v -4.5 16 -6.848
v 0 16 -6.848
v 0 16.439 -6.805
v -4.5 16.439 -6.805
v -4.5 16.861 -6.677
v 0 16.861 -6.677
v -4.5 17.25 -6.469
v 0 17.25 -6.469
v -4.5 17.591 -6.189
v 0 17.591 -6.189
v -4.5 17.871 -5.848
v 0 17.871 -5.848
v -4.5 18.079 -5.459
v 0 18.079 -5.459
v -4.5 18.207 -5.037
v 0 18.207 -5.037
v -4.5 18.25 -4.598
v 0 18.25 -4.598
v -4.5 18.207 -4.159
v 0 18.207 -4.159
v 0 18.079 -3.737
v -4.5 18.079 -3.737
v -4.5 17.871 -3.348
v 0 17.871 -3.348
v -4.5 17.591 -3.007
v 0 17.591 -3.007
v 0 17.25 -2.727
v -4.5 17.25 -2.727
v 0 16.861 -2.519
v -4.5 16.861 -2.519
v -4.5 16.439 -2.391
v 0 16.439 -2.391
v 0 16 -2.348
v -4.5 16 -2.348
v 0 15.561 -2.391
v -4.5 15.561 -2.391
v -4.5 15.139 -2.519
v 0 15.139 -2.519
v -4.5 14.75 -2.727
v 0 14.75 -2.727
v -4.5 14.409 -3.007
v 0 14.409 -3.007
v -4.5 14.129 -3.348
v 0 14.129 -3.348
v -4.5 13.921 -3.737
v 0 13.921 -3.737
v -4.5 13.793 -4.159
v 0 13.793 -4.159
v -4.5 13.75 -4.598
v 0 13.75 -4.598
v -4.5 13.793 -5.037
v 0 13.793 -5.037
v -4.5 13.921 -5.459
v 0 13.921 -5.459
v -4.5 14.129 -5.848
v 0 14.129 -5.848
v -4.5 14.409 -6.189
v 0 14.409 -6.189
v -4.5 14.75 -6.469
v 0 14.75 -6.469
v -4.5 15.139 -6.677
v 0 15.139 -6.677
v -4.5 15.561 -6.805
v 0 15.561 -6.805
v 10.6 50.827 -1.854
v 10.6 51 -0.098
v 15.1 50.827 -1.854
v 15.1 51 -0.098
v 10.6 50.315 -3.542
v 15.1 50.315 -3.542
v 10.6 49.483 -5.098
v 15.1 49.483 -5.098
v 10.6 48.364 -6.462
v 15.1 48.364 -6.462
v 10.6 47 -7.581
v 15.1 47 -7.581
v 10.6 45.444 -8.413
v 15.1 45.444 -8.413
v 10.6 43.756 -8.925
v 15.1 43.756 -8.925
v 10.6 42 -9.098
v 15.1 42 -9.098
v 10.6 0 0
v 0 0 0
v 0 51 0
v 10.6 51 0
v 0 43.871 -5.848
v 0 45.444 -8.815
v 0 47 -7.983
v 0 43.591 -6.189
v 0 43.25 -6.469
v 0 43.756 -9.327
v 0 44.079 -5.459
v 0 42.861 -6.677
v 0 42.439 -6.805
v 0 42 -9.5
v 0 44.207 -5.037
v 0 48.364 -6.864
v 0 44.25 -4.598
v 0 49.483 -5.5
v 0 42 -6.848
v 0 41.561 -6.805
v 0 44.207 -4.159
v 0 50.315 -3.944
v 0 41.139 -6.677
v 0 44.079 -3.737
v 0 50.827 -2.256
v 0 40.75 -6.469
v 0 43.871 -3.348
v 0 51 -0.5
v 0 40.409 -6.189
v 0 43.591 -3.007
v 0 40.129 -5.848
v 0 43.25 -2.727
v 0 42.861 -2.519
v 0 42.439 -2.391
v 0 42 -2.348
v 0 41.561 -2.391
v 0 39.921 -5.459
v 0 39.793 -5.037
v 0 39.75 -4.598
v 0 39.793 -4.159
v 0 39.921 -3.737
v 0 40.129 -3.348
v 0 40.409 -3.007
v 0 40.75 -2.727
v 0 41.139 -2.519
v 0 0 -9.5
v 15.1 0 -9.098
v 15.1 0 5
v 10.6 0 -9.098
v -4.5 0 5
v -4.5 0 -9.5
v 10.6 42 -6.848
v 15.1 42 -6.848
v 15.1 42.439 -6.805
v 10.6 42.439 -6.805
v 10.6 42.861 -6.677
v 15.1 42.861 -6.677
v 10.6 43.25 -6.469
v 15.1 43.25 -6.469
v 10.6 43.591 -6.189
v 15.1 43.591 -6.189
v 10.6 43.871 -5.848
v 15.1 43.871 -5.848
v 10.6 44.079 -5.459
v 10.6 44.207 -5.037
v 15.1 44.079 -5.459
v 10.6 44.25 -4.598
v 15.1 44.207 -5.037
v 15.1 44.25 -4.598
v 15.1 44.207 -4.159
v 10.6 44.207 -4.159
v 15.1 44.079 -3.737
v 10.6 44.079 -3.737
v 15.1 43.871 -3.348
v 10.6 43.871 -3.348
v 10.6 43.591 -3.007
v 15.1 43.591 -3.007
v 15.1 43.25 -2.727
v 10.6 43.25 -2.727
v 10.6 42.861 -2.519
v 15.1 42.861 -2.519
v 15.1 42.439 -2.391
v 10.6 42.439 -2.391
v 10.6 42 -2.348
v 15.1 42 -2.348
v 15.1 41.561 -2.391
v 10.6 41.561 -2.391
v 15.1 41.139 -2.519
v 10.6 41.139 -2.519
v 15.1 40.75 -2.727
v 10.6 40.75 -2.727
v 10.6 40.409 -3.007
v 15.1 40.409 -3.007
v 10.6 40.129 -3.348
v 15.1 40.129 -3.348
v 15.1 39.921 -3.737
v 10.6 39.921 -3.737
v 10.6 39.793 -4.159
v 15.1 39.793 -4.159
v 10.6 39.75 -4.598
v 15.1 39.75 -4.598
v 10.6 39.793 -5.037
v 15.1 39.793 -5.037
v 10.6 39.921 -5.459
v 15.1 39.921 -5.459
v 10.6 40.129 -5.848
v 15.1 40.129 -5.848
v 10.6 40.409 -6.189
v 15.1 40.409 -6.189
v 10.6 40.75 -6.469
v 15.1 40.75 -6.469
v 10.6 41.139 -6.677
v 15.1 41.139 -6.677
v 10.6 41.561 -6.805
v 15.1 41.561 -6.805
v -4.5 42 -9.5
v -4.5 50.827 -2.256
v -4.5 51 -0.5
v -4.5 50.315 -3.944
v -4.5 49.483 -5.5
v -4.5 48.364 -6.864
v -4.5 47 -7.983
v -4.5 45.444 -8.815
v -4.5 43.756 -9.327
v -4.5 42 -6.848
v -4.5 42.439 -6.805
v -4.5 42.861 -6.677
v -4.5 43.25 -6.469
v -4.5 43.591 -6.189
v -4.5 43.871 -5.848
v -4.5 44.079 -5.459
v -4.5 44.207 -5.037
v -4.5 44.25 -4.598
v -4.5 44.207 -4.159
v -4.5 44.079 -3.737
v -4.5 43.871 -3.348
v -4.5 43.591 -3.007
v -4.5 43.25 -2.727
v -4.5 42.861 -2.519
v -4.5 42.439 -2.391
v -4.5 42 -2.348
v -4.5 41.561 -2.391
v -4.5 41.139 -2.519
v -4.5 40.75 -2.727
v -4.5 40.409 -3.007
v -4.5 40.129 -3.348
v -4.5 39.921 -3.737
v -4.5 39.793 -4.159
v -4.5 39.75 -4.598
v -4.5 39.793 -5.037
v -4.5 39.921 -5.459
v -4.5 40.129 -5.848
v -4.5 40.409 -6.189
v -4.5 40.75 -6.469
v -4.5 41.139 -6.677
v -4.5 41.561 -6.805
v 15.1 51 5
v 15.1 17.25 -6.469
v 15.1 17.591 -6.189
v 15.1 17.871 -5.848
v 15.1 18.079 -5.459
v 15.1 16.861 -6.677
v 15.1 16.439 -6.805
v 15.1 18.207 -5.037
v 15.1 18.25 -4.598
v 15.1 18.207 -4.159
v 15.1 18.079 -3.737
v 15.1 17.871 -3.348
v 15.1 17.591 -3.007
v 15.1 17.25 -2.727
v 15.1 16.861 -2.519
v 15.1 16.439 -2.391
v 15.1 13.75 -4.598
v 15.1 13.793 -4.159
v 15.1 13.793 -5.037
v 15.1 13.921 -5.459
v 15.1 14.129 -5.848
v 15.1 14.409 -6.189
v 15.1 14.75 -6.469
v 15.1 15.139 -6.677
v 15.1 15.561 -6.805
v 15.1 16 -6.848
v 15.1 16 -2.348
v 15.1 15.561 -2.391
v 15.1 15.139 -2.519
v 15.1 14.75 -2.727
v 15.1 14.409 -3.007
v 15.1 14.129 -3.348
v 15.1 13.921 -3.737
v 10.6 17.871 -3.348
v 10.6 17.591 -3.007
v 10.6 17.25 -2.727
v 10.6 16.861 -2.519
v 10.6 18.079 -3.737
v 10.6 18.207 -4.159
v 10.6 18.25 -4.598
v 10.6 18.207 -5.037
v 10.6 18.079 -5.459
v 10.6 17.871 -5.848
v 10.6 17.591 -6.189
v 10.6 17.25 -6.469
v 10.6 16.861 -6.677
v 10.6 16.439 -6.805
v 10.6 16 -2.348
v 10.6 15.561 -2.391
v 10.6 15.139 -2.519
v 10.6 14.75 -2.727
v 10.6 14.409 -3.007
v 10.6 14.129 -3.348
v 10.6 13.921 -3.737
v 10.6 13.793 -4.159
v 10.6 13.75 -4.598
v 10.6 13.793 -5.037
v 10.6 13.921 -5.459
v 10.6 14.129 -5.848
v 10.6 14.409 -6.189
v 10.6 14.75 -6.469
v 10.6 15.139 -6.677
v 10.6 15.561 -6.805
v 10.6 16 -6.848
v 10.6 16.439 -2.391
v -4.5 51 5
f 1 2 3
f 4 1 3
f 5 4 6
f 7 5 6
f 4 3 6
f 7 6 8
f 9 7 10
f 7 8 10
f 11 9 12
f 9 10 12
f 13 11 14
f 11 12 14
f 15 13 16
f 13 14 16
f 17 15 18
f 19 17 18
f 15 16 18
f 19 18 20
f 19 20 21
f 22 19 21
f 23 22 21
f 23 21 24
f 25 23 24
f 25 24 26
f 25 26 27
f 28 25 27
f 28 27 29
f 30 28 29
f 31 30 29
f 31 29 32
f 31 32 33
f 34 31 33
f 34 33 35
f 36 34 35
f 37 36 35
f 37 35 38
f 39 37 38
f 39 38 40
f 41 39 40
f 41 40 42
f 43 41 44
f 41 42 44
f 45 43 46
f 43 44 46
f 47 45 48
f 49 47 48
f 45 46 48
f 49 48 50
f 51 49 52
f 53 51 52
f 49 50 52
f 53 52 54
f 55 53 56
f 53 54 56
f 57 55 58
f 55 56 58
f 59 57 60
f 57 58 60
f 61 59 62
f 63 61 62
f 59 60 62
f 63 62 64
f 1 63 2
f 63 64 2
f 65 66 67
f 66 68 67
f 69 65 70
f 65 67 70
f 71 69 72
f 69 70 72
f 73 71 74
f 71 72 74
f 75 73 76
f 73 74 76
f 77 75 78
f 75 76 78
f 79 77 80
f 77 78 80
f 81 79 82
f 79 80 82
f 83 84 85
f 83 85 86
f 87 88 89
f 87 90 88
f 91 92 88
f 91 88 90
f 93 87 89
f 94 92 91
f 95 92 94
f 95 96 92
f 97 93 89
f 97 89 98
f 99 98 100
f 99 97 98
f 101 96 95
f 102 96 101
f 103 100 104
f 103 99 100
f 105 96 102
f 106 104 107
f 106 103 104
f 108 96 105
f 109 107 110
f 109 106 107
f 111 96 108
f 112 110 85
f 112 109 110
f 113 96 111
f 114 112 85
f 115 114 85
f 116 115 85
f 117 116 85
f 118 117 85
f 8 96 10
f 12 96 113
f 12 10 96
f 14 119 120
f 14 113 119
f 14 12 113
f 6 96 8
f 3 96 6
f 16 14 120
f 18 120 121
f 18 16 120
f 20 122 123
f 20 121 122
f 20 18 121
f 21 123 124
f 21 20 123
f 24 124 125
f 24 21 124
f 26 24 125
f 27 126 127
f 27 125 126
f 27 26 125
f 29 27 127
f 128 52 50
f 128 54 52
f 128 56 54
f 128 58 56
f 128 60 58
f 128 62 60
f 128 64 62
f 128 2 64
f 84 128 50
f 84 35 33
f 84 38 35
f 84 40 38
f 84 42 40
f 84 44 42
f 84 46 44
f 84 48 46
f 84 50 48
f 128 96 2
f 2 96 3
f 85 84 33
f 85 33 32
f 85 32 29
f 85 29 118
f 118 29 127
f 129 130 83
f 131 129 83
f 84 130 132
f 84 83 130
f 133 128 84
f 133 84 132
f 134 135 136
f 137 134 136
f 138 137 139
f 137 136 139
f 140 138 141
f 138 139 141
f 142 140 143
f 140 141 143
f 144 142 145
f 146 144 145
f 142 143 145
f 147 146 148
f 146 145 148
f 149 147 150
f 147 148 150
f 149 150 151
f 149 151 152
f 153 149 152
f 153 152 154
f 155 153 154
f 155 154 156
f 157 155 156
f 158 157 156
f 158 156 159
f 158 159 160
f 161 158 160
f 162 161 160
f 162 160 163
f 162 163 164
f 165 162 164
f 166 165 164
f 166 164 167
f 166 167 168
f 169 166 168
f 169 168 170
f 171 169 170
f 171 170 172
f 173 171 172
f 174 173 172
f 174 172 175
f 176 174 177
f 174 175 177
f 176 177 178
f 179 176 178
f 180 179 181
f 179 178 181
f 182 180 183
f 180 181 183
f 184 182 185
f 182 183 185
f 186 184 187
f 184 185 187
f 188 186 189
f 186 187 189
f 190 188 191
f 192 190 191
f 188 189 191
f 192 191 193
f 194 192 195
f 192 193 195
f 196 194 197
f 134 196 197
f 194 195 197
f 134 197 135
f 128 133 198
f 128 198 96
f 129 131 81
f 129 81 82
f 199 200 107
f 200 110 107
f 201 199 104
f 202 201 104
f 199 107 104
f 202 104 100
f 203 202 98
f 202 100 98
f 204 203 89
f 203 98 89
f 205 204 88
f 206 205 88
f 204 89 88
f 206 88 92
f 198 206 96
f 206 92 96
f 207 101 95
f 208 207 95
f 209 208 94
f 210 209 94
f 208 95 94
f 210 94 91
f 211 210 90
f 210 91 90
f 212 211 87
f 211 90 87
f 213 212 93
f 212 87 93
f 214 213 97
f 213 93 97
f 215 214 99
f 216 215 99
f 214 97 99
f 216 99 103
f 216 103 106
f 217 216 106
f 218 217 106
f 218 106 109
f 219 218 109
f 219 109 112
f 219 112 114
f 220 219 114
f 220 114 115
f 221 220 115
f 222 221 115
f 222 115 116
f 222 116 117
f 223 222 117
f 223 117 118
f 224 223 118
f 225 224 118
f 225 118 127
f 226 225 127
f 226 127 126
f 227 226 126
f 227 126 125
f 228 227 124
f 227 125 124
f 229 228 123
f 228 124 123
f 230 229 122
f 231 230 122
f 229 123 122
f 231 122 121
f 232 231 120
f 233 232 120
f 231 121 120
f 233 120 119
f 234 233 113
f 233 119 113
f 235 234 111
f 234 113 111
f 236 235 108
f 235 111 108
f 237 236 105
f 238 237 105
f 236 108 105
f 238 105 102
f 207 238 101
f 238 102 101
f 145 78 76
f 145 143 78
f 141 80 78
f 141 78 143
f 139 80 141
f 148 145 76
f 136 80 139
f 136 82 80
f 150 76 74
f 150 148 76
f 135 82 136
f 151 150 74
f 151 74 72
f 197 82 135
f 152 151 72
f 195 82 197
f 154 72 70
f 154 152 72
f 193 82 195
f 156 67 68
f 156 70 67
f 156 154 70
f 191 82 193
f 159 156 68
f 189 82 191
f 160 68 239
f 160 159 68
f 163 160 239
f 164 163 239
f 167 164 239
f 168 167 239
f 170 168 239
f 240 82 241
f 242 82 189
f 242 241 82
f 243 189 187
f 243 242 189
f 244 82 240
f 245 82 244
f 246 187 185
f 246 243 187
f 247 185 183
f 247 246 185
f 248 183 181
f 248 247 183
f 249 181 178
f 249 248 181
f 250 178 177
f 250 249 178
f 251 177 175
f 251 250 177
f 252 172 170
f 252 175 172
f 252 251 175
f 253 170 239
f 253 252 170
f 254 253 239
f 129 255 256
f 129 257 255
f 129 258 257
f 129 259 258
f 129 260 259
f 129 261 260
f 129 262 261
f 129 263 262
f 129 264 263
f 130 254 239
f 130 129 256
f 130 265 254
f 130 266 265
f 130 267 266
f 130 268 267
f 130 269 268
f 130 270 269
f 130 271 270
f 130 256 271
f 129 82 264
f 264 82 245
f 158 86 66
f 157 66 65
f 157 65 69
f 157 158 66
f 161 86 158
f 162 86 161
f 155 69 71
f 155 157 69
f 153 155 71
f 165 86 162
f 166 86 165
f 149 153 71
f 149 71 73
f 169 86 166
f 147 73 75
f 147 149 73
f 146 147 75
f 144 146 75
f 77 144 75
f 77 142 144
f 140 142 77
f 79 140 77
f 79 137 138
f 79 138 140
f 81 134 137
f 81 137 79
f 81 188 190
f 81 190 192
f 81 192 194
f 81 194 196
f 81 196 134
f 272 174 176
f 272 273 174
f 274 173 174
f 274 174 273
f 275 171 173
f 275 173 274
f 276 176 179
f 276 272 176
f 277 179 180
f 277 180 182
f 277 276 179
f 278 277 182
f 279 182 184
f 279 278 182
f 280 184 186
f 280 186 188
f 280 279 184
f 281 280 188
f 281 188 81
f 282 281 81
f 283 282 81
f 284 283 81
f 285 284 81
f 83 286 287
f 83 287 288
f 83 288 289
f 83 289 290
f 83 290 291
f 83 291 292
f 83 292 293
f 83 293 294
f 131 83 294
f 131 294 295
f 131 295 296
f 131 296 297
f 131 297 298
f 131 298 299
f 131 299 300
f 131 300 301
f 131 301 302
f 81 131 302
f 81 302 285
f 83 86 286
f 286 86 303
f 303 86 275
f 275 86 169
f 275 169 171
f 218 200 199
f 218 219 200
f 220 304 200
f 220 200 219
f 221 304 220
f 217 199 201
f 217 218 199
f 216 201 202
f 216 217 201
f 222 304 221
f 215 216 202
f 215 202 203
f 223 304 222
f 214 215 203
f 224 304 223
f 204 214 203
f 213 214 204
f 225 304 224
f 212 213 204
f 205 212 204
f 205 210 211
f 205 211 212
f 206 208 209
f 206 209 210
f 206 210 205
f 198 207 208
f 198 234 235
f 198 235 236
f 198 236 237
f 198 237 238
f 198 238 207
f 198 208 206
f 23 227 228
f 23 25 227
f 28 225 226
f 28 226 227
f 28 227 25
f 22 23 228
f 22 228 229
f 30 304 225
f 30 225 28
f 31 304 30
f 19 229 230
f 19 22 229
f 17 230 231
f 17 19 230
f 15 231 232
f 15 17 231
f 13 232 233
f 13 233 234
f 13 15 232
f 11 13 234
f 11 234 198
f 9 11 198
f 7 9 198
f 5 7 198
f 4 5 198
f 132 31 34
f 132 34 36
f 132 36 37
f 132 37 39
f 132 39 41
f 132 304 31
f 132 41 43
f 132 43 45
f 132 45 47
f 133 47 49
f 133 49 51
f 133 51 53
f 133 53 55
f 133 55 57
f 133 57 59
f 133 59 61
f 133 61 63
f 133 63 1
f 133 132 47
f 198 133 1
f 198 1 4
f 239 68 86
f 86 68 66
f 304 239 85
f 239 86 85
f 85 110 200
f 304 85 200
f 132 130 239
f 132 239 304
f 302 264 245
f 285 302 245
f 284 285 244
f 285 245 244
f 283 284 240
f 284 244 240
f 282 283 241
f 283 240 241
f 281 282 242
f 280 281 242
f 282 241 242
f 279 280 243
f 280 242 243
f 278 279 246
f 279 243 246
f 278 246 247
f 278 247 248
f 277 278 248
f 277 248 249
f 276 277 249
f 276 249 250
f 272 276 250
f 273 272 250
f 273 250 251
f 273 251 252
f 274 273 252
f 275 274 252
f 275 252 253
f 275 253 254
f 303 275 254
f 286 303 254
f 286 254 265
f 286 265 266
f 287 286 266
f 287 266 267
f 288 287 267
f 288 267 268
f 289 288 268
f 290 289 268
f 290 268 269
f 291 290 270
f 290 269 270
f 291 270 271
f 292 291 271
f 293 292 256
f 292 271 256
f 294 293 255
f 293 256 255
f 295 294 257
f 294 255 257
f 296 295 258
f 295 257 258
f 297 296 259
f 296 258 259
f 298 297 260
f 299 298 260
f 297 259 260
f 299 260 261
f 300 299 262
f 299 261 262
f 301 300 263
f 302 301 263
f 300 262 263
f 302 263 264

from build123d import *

# Parameters (mm, degrees)
EXTRUDE_1_DEPTH     = 51
SKETCH_2_R          = 2.25
CUT_EXTRUDE_1_DEPTH = 56.456379254
FILLET_1_R          = 9


with BuildPart() as part:
    # Эскиз1 → Бобышка-Вытянуть1 (new body)
    with BuildSketch(Plane(origin=(0, 0, 0), x_dir=(1, 0, 0), z_dir=(0, 1, 0))):
        Polygon((0, 0), (10.6, 0), (10.6, 9.097791798), (15.1, 9.097791798), (15.1, -5), (-4.5, -5), (-4.5, 9.5), (0, 9.5), align=None)
    extrude(amount=EXTRUDE_1_DEPTH)

    # Эскиз2 → Вырез-Вытянуть1 (cut, through all)
    with BuildSketch(Plane(origin=(15.1, 0, 0), x_dir=(0, 0, -1), z_dir=(1, 0, 0))):
        with Locations((4.597791798, 42)):
            Circle(SKETCH_2_R)
        with Locations((4.597791798, 16)):
            Circle(SKETCH_2_R)
    extrude(amount=-CUT_EXTRUDE_1_DEPTH, mode=Mode.SUBTRACT)

    # Скругление1
    fillet_1_edges = [part.edges().sort_by_distance(p)[0] for p in [
        (12.85, 51, -9.097791798),
        (-2.25, 51, -9.5),
    ]]
    fillet(fillet_1_edges, radius=FILLET_1_R)


solid = part.part
